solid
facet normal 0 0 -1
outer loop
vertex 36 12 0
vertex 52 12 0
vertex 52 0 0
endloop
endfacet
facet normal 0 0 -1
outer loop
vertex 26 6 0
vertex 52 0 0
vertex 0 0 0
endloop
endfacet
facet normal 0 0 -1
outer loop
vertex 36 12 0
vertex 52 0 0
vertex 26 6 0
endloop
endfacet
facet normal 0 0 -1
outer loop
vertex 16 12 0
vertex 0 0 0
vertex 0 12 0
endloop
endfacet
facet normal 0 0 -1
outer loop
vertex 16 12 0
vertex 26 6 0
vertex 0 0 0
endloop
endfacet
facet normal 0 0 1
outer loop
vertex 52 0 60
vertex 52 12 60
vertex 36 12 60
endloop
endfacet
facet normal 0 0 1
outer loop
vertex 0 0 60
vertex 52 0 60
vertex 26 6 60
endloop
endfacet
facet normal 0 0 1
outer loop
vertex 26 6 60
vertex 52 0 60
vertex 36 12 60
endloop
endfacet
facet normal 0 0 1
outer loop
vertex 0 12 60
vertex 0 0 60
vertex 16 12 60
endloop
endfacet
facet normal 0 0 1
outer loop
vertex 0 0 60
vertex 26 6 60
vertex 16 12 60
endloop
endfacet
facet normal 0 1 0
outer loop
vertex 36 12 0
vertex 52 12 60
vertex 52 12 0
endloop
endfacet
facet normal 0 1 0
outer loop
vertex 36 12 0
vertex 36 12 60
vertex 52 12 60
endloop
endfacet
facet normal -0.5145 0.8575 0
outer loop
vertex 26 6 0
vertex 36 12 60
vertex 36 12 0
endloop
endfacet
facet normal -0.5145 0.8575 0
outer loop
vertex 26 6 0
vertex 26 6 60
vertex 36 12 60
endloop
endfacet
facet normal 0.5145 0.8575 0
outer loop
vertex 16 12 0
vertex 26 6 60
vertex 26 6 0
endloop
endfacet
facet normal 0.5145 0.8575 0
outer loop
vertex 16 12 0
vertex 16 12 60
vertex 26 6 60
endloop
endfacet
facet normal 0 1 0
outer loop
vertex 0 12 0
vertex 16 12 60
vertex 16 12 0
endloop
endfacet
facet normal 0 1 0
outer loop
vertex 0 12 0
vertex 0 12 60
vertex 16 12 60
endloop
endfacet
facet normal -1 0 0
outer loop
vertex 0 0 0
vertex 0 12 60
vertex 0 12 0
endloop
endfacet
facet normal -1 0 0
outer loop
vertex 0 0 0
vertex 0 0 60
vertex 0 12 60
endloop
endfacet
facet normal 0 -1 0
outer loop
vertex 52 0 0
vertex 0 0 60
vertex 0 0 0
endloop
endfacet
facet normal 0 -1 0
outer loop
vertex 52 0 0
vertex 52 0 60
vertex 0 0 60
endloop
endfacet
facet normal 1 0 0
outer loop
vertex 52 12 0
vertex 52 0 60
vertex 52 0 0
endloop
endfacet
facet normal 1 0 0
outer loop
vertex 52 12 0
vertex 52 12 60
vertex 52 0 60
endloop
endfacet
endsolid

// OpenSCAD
$fn = 32;

// ----------------------------------------------------------------------
// V guide rail: vway, 52 mm wide
// ----------------------------------------------------------------------

// --- parameters (mm) ---
rail_w = 52;              // rail width, X
base_t = 12;              // base plate thickness
v_depth = 6;              // V feature depth / height
v_half_w = 10;            // half width of the V at the base face
plate_t = 60;             // rail length, Z (the extrusion height)

profile = [[0, 0], [52, 0], [52, 12], [36, 12], [26, 6], [16, 12], [0, 12]];  // primary outline, 7 points, counter clockwise

// --- the one profile operation ---
linear_extrude(height = plate_t) polygon(points = profile);
